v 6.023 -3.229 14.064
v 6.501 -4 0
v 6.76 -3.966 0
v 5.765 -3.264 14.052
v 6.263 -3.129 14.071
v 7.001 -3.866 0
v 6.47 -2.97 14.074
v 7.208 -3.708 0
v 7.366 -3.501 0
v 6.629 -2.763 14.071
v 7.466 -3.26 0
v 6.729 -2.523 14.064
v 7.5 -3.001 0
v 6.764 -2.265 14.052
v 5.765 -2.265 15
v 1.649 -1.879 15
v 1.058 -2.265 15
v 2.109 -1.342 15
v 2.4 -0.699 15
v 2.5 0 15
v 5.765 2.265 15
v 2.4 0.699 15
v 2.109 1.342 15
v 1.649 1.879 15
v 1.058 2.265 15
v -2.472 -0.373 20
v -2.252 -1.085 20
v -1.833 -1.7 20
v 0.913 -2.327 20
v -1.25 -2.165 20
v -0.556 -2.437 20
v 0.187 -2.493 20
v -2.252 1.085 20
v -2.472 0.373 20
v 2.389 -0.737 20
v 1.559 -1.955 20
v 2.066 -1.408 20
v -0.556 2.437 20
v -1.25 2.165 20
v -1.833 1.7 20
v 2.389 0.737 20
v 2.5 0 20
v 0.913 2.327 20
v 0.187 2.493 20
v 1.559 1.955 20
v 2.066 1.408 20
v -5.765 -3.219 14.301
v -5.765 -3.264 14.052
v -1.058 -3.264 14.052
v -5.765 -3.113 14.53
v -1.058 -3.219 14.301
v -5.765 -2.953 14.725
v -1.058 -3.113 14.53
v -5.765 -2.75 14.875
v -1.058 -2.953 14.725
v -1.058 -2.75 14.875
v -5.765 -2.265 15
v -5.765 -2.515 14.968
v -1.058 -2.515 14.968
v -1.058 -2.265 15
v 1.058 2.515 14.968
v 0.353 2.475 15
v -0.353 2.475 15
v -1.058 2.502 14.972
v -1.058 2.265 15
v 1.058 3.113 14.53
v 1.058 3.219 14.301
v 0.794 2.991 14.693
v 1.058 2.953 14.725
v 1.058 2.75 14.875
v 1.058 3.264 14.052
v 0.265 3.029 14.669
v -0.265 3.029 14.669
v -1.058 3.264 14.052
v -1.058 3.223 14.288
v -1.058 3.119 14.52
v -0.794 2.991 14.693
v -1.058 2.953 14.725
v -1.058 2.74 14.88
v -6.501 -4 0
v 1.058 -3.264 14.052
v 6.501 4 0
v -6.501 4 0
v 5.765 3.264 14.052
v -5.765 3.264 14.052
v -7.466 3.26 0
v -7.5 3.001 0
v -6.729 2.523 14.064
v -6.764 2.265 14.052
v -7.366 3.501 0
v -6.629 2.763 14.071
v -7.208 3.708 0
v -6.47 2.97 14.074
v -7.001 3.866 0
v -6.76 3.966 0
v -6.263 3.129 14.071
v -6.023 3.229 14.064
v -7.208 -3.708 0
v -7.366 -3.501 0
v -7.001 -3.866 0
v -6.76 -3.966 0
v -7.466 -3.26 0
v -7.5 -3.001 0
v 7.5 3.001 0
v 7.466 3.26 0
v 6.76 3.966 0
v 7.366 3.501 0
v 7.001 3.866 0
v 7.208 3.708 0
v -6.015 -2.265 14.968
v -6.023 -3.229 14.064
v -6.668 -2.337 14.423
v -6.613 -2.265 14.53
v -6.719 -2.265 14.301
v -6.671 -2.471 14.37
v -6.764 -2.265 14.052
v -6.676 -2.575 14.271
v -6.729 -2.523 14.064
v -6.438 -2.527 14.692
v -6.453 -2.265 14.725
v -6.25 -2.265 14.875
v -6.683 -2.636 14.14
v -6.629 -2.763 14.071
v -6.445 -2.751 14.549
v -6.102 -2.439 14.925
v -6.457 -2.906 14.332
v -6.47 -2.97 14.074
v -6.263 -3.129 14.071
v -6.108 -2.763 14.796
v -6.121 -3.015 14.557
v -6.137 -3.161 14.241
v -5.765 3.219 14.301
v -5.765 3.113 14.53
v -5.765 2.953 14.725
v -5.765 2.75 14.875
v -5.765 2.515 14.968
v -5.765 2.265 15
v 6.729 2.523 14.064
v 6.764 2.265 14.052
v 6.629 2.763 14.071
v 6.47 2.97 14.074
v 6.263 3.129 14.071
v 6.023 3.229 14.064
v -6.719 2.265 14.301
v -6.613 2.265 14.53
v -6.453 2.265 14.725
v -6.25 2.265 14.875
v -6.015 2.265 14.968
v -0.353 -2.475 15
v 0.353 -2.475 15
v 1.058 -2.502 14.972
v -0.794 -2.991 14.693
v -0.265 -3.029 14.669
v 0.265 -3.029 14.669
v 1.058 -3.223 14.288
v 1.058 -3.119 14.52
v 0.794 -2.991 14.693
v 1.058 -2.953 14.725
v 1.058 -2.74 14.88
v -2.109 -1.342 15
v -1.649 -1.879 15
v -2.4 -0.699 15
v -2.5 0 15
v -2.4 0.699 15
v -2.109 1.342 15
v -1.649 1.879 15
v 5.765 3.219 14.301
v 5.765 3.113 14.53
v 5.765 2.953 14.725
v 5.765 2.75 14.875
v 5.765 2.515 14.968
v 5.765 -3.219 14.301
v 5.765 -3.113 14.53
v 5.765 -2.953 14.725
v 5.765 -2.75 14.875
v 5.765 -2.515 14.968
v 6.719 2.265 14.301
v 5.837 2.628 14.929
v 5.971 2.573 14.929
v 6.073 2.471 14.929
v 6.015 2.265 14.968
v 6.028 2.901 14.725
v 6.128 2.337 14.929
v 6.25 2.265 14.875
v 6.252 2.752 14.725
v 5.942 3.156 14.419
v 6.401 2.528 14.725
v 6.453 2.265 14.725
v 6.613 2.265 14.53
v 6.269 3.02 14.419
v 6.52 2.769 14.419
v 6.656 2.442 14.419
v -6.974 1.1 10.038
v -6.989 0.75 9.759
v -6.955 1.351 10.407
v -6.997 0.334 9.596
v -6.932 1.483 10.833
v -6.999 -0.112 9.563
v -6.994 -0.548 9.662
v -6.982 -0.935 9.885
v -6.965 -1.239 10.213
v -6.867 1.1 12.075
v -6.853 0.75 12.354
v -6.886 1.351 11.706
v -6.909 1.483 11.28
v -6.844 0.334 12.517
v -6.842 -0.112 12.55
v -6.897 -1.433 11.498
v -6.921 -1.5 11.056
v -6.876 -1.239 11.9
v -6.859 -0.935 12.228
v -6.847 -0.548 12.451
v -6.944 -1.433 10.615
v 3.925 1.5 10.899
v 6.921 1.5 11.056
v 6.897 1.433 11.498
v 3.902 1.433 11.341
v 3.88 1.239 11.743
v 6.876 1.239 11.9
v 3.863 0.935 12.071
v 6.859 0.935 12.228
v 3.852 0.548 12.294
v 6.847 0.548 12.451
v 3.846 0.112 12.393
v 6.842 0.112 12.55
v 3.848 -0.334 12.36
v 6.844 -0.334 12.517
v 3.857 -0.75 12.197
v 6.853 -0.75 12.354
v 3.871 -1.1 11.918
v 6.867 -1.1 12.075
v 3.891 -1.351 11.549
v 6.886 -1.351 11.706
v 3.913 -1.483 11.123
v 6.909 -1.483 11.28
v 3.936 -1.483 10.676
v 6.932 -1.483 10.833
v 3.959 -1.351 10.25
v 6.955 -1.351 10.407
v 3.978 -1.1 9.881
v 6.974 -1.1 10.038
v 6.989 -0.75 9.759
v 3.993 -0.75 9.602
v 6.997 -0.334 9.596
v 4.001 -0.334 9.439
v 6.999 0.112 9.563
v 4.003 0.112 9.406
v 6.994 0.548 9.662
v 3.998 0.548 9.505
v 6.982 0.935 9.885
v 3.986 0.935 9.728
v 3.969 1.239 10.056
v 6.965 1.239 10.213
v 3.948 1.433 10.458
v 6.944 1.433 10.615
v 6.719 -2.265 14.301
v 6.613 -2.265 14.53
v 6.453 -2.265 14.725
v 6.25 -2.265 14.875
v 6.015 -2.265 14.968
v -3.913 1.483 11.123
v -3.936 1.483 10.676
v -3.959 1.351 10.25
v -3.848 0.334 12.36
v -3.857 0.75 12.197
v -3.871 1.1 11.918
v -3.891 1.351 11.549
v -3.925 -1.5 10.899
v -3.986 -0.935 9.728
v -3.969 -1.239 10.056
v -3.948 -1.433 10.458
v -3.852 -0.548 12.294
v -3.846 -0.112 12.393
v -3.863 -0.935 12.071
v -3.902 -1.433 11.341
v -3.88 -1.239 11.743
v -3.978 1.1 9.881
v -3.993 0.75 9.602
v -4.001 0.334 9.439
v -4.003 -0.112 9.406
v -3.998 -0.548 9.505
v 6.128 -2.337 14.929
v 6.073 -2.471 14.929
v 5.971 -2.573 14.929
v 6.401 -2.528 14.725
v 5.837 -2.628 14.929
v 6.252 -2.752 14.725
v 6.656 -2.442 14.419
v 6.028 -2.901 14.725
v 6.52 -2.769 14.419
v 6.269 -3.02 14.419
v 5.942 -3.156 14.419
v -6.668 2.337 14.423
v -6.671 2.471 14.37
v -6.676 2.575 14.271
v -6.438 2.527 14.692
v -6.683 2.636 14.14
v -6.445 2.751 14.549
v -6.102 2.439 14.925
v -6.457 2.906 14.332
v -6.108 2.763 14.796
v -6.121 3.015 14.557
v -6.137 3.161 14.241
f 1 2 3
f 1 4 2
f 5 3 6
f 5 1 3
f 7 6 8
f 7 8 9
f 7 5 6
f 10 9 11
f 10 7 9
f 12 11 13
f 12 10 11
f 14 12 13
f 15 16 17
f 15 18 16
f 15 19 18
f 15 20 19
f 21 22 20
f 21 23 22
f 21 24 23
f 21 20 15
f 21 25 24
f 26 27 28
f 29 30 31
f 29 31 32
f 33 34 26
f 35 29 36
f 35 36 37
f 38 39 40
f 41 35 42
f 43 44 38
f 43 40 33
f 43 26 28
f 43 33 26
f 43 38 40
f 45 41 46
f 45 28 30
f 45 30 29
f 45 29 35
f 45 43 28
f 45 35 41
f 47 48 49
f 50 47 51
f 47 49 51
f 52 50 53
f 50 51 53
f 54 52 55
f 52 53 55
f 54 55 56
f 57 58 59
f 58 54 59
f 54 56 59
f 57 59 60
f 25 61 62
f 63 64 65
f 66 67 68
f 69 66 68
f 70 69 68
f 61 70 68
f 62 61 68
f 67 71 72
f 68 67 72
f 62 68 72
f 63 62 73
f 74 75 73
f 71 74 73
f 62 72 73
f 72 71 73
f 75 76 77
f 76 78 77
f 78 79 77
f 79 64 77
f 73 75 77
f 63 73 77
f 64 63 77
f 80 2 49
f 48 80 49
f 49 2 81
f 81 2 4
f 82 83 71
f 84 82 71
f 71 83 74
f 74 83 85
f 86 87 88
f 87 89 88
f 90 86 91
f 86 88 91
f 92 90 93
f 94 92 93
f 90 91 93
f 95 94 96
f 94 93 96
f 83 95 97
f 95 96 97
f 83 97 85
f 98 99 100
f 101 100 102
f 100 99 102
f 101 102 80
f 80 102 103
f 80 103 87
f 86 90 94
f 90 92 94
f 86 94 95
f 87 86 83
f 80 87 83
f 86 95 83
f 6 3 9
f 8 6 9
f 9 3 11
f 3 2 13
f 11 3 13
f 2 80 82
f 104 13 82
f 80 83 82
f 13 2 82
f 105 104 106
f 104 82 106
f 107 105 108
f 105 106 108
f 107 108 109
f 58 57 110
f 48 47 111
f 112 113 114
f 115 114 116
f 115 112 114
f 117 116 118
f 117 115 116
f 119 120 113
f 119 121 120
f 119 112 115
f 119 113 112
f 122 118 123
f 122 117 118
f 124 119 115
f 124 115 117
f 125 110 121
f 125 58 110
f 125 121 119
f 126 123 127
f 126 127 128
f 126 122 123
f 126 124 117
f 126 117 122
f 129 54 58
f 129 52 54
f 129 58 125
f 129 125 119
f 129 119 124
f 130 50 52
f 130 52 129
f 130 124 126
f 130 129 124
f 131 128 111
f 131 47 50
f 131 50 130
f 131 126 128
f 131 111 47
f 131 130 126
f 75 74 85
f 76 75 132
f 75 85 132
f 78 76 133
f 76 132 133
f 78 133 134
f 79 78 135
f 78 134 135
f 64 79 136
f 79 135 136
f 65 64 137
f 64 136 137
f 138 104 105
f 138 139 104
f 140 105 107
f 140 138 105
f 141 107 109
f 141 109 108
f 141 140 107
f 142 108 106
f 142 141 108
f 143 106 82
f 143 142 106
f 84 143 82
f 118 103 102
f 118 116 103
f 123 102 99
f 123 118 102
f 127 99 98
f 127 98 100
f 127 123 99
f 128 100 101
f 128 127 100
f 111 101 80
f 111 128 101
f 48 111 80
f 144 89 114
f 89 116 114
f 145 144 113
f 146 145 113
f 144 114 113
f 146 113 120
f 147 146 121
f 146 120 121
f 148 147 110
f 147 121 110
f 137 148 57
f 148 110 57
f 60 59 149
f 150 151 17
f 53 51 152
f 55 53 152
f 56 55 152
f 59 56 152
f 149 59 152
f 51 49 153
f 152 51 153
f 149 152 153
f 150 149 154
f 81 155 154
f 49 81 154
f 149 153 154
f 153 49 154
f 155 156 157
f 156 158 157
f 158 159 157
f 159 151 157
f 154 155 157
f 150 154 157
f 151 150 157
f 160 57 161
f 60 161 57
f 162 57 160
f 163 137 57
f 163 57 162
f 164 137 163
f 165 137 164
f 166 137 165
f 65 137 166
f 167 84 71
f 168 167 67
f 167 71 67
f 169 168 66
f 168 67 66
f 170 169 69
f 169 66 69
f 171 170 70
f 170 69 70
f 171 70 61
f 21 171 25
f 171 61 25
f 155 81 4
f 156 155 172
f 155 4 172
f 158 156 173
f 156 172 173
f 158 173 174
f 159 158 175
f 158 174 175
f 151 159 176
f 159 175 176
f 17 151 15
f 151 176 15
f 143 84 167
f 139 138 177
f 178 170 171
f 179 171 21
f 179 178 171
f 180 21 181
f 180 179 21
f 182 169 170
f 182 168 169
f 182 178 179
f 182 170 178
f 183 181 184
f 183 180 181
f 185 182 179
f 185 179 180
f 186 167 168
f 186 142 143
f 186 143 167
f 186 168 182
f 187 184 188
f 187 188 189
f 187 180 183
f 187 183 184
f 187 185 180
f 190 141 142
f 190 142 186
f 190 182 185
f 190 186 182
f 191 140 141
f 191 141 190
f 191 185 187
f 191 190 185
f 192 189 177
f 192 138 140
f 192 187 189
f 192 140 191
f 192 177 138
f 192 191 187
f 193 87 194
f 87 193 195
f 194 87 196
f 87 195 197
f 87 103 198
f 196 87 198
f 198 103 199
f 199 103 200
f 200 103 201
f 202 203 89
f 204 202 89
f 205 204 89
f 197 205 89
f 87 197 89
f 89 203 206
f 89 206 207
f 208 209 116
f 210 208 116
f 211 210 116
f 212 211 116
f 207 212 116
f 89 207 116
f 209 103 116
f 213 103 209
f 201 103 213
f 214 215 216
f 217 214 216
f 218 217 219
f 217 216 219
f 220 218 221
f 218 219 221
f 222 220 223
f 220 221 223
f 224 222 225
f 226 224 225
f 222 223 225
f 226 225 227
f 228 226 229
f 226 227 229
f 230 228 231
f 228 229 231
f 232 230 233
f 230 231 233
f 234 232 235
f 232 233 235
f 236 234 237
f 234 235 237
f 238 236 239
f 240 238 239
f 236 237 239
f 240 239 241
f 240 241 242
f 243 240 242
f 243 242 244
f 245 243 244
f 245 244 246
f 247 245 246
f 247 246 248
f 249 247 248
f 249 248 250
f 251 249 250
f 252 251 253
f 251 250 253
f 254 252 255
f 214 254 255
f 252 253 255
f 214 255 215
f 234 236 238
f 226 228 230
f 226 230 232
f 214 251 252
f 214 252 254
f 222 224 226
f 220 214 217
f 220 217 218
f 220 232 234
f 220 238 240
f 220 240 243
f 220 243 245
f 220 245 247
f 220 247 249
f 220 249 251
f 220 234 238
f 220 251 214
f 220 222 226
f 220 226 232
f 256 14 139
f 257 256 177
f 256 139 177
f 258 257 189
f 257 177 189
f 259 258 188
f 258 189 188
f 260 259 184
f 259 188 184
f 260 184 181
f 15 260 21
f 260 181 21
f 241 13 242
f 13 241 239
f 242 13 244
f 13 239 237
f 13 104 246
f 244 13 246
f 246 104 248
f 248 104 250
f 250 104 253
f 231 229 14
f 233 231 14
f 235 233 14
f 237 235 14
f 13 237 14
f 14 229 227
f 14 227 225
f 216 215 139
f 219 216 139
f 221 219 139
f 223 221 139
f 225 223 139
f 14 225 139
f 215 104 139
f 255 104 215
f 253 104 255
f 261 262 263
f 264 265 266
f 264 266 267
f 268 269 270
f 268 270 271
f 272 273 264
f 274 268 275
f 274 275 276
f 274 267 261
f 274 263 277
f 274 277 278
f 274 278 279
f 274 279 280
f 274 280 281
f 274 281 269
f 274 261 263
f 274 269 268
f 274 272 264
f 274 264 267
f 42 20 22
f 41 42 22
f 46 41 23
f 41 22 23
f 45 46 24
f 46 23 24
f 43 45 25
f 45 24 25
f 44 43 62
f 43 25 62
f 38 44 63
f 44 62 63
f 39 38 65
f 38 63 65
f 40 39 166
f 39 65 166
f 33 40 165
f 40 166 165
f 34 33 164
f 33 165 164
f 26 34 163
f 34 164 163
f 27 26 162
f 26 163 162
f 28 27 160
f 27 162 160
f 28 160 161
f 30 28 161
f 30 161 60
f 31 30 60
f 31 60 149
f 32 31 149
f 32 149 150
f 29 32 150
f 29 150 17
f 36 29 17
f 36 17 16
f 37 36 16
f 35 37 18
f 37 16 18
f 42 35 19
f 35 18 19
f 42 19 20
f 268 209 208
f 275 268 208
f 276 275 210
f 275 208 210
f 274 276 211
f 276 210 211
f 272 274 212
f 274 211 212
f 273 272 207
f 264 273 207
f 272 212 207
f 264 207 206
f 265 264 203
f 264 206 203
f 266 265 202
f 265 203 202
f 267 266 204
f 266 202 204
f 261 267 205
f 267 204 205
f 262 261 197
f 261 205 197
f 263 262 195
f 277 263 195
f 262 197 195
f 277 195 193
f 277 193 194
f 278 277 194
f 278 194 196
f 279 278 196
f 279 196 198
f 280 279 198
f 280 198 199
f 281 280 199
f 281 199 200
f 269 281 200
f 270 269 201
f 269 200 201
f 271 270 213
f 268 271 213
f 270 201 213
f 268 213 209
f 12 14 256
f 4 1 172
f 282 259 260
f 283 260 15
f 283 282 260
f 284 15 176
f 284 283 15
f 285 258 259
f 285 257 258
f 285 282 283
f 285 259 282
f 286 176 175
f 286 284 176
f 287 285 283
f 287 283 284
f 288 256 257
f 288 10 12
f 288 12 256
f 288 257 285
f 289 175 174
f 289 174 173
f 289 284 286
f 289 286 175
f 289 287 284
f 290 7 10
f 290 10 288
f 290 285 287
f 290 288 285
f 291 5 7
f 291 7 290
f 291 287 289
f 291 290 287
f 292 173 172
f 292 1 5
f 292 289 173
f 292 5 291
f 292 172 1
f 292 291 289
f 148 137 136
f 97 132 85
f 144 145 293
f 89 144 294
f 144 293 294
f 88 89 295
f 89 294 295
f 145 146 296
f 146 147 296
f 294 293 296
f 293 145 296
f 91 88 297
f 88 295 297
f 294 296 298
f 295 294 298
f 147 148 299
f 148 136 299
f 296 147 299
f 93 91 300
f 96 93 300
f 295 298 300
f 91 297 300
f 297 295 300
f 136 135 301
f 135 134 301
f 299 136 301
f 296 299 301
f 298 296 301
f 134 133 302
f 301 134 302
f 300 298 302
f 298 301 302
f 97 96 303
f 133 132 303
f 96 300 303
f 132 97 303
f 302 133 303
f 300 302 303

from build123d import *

# Parameters (mm, degrees)
F0_W      = 15
F0_H      = 8
F1_DEPTH  = 15
F1_TAPER  = 3
F2_R      = 2.5
F3_DEPTH  = 5
F4_R      = 1
F6_R      = 1.5
F7_DEPTH  = 1.5
F8_R      = 1.5
F9_DEPTH  = 3
F10_R     = 1.5
F11_DEPTH = 3


with BuildPart() as f1:
    # F0 (on Top) → F1 (new body)
    with BuildSketch(Plane.XY):
        Rectangle(F0_W, F0_H)
    extrude(amount=F1_DEPTH, taper=F1_TAPER)

    # F2 (on face) → F3 (join)
    with BuildSketch(Plane.XY.offset(15)):
        Circle(F2_R)
    extrude(amount=F3_DEPTH)

    # F4
    f4_edges = [f1.edges().sort_by_distance(p)[0] for p in [
        (7.106942, -3.606942, 7.5),
        (7.106942, 3.606942, 7.5),
        (0, 3.213883, 15),
        (6.713883, 0, 15),
        (0, -3.213883, 15),
        (-6.713883, 0, 15),
        (-7.106942, -3.606942, 7.5),
        (-7.106942, 3.606942, 7.5),
    ]]
    fillet(f4_edges, radius=F4_R)

    # F6 (on Right) → F7 (join, symmetric)
    with BuildSketch(Plane.YZ):
        with Locations((0, 11.0523359562)):
            Circle(F6_R)
    extrude(amount=F7_DEPTH, both=True)

    # F8 (on face) → F9 (cut)
    with BuildSketch(Plane(origin=(-7.4794571076, 0, 0.3919817373), x_dir=(0, -1, 0), z_dir=(-0.9986295348, 0, 0.0523359562))):
        with Locations((0, 10.6791009514)):
            Circle(F8_R)
    extrude(amount=-F9_DEPTH, mode=Mode.SUBTRACT)

    # F10 (on face) → F11 (cut)
    with BuildSketch(Plane(origin=(7.4794571076, 0, 0.3919817373), x_dir=(0, 1, 0), z_dir=(0.9986295348, 0, 0.0523359562))):
        with Locations((0, 10.6791009514)):
            Circle(F10_R)
    extrude(amount=-F11_DEPTH, mode=Mode.SUBTRACT)


solid = f1.part
